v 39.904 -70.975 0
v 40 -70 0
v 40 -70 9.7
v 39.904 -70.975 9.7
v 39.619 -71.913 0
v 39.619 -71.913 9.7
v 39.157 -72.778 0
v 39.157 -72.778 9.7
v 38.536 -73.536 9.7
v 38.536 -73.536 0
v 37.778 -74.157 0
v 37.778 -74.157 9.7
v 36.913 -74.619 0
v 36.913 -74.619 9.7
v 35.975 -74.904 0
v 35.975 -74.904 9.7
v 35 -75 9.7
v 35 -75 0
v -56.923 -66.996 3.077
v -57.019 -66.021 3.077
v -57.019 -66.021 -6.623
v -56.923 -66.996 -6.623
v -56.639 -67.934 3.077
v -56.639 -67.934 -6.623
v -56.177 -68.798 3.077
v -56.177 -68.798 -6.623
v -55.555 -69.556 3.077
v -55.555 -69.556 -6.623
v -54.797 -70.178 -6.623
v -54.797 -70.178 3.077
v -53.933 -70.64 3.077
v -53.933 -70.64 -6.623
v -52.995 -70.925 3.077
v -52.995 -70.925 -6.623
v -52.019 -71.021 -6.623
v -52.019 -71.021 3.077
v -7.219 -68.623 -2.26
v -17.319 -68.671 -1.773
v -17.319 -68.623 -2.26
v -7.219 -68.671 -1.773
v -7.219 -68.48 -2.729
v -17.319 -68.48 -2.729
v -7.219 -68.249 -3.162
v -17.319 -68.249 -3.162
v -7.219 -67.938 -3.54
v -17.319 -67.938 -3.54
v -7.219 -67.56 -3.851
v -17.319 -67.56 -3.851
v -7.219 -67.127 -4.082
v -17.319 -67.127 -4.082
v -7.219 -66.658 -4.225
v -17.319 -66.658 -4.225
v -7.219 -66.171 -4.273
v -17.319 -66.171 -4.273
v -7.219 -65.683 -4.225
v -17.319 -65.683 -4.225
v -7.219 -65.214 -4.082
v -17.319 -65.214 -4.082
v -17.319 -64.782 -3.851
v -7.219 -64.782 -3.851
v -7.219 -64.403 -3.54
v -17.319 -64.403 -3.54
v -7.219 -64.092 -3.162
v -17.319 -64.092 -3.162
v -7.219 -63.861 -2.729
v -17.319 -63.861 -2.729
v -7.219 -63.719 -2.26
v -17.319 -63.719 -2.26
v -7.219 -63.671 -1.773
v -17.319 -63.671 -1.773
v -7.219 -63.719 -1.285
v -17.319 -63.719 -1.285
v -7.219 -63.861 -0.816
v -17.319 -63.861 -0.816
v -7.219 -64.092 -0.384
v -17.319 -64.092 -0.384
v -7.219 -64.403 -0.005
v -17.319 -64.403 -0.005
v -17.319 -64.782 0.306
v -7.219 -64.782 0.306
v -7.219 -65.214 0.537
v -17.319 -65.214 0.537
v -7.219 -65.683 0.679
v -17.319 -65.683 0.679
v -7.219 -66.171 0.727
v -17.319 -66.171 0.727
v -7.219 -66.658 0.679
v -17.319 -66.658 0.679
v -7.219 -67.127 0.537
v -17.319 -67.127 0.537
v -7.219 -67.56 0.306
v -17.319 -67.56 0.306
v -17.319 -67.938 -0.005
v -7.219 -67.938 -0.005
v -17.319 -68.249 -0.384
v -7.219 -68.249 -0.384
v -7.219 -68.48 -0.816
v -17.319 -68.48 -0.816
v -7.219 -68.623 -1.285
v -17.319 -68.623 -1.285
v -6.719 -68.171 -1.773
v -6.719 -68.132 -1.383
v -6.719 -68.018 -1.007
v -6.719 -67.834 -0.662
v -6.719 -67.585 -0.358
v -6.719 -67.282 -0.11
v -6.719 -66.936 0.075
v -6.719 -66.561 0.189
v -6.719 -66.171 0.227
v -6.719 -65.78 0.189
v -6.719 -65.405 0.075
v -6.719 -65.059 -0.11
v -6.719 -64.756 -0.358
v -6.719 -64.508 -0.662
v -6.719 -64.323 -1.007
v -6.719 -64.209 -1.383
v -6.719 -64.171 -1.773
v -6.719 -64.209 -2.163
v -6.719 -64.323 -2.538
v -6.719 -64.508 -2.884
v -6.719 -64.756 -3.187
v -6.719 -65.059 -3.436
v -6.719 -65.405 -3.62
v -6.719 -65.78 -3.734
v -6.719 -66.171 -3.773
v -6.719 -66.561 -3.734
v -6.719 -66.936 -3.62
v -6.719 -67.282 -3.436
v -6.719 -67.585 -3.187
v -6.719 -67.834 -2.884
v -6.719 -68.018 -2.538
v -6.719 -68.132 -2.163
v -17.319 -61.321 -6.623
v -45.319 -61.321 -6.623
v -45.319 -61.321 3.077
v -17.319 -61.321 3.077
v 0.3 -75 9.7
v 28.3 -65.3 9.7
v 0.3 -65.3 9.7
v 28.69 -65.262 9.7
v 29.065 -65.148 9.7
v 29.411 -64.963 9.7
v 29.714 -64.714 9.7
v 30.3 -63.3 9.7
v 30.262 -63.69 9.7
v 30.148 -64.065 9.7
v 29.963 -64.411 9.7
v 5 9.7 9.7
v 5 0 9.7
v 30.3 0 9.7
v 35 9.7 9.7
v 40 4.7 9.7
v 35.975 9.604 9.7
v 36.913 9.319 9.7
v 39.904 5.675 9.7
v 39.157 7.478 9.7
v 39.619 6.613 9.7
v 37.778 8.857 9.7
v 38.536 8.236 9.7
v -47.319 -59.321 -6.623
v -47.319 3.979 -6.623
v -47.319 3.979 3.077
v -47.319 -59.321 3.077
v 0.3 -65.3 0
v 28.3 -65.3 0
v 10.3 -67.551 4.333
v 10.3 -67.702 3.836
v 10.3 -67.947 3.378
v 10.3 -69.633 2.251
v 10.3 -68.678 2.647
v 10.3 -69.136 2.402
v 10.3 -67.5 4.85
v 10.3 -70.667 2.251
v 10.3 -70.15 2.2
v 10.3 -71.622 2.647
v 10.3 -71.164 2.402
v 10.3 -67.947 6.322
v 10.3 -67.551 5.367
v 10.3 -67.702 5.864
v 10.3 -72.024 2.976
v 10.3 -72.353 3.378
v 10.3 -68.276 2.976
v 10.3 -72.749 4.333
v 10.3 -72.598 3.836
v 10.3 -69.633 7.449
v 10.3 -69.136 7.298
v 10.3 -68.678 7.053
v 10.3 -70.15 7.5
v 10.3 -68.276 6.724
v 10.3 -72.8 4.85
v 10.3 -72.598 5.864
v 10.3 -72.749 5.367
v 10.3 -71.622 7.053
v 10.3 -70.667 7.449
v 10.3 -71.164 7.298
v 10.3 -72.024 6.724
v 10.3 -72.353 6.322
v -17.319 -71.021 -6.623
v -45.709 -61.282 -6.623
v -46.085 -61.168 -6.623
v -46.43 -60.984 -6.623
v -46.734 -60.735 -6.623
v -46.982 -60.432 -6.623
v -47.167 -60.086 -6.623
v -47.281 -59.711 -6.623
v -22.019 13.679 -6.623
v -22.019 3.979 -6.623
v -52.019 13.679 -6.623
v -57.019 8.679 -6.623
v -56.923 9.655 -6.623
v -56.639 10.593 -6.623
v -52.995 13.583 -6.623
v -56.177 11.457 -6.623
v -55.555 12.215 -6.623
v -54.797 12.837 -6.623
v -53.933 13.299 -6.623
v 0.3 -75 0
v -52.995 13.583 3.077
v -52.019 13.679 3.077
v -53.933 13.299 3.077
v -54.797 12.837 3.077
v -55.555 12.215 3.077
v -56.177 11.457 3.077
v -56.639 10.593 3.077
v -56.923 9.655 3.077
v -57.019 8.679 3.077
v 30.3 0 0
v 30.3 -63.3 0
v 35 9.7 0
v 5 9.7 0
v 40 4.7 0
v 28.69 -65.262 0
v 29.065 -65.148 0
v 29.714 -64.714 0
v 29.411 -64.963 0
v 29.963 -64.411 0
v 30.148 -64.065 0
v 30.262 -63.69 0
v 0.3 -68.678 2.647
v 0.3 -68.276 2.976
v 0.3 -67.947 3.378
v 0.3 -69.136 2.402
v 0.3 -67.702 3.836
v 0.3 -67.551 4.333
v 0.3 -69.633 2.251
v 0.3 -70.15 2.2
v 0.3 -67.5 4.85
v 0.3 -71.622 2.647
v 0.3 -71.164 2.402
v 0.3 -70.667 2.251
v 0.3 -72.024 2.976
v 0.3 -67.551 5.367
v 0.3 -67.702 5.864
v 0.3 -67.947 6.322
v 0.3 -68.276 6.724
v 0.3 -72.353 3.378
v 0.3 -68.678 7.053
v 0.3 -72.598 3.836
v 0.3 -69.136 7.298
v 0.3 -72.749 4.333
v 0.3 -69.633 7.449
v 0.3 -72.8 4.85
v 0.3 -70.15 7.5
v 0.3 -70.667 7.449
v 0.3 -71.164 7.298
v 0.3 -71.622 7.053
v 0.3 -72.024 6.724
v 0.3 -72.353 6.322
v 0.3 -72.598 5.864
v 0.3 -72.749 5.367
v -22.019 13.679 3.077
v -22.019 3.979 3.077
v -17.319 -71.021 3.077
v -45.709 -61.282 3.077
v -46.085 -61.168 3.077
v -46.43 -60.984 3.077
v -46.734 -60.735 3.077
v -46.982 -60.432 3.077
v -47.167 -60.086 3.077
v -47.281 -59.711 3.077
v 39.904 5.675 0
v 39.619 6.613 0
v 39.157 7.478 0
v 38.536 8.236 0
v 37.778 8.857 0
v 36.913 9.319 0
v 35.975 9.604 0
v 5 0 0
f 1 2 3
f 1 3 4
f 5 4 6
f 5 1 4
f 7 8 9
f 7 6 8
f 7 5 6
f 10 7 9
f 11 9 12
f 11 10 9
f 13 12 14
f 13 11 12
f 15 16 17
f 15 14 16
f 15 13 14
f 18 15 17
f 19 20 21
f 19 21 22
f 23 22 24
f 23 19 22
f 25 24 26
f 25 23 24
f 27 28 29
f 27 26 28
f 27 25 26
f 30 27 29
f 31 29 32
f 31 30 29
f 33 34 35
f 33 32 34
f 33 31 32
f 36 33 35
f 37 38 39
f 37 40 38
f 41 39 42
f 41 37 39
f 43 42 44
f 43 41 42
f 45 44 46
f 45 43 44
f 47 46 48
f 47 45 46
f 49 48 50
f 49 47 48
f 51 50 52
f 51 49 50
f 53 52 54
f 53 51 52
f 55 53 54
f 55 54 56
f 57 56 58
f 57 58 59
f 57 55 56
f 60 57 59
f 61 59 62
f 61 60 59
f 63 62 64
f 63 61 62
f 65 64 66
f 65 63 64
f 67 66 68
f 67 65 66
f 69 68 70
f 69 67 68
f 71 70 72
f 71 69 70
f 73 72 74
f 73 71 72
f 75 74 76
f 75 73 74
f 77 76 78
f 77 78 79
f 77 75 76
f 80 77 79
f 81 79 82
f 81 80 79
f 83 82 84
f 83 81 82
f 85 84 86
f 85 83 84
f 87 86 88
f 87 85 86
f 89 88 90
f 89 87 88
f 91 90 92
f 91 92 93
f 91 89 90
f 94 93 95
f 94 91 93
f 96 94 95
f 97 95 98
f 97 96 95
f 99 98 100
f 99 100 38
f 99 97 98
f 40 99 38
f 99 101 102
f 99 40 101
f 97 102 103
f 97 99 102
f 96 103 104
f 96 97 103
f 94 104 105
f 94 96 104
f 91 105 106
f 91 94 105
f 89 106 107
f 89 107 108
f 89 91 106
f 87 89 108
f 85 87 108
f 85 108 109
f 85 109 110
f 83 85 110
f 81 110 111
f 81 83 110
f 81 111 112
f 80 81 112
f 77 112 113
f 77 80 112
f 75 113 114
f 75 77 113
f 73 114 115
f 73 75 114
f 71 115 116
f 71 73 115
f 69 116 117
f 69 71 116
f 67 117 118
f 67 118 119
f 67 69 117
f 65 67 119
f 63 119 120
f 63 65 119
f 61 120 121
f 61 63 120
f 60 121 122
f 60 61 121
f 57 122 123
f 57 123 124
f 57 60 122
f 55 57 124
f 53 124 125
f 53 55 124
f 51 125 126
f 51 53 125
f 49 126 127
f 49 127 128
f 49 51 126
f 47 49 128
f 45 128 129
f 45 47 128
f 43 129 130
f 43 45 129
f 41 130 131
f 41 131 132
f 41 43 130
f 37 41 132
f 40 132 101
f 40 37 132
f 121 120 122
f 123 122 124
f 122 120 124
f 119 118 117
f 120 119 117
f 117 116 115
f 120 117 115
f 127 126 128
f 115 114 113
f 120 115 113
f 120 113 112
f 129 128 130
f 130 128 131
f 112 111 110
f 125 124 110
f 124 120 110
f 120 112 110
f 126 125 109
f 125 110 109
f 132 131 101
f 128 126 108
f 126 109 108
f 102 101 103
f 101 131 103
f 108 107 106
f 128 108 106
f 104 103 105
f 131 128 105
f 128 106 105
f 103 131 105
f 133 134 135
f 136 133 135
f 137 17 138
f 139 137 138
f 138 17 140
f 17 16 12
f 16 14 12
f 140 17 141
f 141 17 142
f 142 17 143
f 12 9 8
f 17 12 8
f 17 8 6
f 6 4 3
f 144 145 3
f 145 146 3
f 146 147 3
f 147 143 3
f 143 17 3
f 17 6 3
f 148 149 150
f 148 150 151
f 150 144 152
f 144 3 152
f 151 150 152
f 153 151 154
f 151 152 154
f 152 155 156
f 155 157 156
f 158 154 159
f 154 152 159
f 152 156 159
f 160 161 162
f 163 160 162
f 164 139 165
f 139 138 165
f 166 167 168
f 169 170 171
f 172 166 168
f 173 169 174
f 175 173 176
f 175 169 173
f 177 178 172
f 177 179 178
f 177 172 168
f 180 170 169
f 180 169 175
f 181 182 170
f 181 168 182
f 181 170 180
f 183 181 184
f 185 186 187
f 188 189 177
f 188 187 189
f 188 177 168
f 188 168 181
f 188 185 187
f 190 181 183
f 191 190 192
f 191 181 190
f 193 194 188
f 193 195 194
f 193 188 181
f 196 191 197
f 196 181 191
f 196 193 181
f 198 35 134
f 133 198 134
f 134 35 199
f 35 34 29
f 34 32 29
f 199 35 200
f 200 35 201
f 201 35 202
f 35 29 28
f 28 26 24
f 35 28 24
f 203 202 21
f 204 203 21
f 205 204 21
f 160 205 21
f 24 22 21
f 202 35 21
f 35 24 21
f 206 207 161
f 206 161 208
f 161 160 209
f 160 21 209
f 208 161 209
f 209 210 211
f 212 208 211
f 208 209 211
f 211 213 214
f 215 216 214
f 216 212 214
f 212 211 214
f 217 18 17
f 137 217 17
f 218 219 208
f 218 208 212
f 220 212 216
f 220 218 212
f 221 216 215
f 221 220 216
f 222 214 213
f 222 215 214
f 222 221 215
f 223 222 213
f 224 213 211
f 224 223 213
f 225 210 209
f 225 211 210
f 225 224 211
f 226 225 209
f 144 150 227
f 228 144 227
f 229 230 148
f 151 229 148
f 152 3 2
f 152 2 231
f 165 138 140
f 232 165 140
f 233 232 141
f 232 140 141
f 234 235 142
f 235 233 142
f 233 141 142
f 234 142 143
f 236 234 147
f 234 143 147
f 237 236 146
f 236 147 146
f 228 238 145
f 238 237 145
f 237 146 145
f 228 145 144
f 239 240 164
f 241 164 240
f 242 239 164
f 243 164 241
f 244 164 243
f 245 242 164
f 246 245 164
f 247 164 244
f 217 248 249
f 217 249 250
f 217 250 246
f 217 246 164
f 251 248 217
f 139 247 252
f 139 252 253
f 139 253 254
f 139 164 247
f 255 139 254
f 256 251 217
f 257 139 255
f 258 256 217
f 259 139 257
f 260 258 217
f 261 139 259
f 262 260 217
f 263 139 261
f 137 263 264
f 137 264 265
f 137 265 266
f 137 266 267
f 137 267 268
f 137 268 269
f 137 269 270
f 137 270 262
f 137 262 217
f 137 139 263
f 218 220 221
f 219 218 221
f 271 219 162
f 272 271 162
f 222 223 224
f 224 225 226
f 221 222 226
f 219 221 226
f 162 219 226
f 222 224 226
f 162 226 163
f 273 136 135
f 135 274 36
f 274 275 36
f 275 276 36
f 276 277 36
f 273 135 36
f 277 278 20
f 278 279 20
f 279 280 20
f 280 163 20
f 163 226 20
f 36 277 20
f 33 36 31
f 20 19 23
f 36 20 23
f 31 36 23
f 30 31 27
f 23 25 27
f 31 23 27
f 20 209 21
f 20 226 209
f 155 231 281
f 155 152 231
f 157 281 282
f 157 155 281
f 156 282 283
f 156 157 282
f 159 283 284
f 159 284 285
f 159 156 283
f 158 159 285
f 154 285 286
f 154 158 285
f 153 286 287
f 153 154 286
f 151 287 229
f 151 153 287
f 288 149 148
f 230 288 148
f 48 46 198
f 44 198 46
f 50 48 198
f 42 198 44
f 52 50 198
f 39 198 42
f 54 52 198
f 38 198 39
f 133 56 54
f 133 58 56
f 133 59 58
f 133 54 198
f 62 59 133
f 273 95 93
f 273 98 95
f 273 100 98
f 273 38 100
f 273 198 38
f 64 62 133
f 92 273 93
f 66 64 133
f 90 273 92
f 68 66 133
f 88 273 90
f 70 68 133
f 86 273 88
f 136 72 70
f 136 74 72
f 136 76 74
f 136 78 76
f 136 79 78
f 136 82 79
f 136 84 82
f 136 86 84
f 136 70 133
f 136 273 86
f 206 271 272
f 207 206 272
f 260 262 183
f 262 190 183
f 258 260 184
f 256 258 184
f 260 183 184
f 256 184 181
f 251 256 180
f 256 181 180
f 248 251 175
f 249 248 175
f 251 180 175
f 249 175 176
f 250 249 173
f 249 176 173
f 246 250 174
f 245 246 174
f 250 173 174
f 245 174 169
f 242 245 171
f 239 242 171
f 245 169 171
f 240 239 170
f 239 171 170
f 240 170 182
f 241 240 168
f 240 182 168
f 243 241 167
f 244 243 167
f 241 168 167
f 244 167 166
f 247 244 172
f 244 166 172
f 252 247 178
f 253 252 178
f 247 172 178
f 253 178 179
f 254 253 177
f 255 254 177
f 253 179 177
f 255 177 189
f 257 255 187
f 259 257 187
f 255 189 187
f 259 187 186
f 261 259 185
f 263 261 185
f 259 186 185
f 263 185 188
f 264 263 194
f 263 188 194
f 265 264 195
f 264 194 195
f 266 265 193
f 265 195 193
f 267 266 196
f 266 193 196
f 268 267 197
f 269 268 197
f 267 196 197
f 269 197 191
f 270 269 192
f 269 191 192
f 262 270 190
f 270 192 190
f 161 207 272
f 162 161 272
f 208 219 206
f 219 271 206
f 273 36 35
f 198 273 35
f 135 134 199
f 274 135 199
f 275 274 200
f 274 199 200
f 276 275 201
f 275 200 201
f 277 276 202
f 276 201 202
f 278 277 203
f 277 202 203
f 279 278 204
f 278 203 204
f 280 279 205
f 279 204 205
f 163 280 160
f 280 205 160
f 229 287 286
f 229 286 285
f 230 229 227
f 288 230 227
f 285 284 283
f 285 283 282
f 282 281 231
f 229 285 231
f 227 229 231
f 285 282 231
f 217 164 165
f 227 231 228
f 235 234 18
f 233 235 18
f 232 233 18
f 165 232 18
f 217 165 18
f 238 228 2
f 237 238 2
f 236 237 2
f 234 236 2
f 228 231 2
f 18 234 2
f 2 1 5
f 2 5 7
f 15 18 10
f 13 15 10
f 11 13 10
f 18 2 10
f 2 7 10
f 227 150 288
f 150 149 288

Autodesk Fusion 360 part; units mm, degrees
sketch "Sketch1" plane through (0, 0, 0) normal (1, 0, 0) x (0, 1, 0)
  line L0 (0, 0) -> (9.7, 0)
  line L1 (9.7, 0) -> (9.7, 9.7)
  line L2 (9.7, 9.7) -> (0, 9.7)
  line L3 (0, 9.7) -> (0, 0)
  dimension "d1" = 9.7
  dimension "d2" = 9.7
extrude "Extrude1" add sketch "Sketch1" along normal blind 40 makes body 1
sketch "Sketch2" plane through (0, 0, 0) normal (0, -1, 0) x (1, 0, 0)
  line L0 (0, 9.7) -> (0, 0)
  line L1 (0, 0) -> (40, 0)
  line L2 (40, 0) -> (40, 9.7)
  line L3 (40, 9.7) -> (0, 9.7)
  line L4 (40, 9.7) -> (30.3, 9.7)
  line L5 (30.3, 9.7) -> (30.3, 0)
  line L6 (30.3, 0) -> (40, 0)
  line L7 (40, 0) -> (40, 9.7)
  dimension "d5" = 9.7
extrude "Extrude2" add sketch "Sketch2" along normal blind 75 contours L1 L2 L3 L4 L5 L6 L7 bodies 1
sketch "Sketch3" plane through (30.3, 0, 0) normal (-1, 0, 0) x (0, -1, 0)
  line L0 (0, 9.7) -> (0, 0)
  line L1 (0, 0) -> (75, 0)
  line L2 (75, 0) -> (75, 9.7)
  line L3 (75, 9.7) -> (0, 9.7)
  line L4 (75, 9.7) -> (65.3, 9.7)
  line L5 (65.3, 9.7) -> (65.3, -2.721)
  line L6 (65.3, -2.721) -> (75, -2.721)
  line L7 (75, -2.721) -> (75, 9.7)
  dimension "d8" = 9.7
extrude "Extrude3" add sketch "Sketch3" along normal blind 30 contours L1 L2 L3 L4 L5 L7 bodies 1
sketch "Sketch4" plane through (0.3, 0, 0) normal (-1, 0, 0) x (0, -1, 0)
  line L0 (75, 0) -> (75, 9.7)
  line L1 (75, 9.7) -> (65.3, 9.7)
  line L2 (65.3, 9.7) -> (65.3, 0)
  line L3 (65.3, 0) -> (75, 0)
  circle A0 centre (70.15, 4.85) radius 2.5
  line L4 (70.15, 9.7) -> (70.15, 0)
  line L5 (65.3, 4.85) -> (75, 4.85)
  dimension "d11" = 5
extrude "Extrude5" cut sketch "Sketch4" along normal mid plane 20 contours A0 L4 L5 | A0 L4 L5 | A0 L4 L5 | A0 L4 L5 bodies 1
mirror "Mirror1" about plane through (0, 0, 0) normal (1, 0, 0) of bodies 1 makes body 2
extrude "Extrude6" add sketch "Sketch4" along normal up to surface (10.6 mm away) and the other way blind 10 contours A0 L4 L5 | A0 L4 L5 | A0 L4 L5 | A0 L4 L5 bodies 2
chamfer "Chamfer1" distance 0.5 angle 45 1 edges at (10.3, -67.8192, 5.754) on bodies 2
copy_body "Body->Comp1" bodies 1 removing the originals makes body 3 in component "Component"
copy_body "Body->Comp2" bodies 2 removing the originals makes body 4 in component "Component'"
move_face "OffsetFaces1" offset -0.15 1 faces at (3.6333, -72.6376, 5.0989) on bodies 3 in component "Component"
extrude "Extrude1'" cut 1 faces at (0, 3.2333, 6.4667) along direction (1, 0, 0) blind 5 on bodies 3 bodies 3 in component "Component"
extrude "Extrude1''" cut 1 faces at (0, 3.2333, 6.4667) along direction (-1, 0, 0) blind 5 on bodies 4 bodies 4 in component "Component'"
fillet "Fillet1" radius 2 1 edges at (30.3, -65.3, 4.85) on bodies 3 in component "Component"
fillet "Fillet1'" radius 2 1 edges at (-30.3, -65.3, 4.85) on bodies 4 in component "Component'"
fillet "Fillet2" radius 5 1 edges at (40, -75, 4.85) on bodies 3 in component "Component"
fillet "Fillet2'" radius 5 1 edges at (-40, -75, 4.85) on bodies 4 in component "Component'"
fillet "Fillet3" radius 5 1 edges at (40, 9.7, 4.85) on bodies 3 in component "Component"
fillet "Fillet3'" radius 5 1 edges at (-40, 9.7, 4.85) on bodies 4 in component "Component'"
component "Component" placed x (1, 0, 0) y (0, 1, 0) z (0, 0, 1) at (0, 0, 0)
component "Component'" placed x (1, 0, 0) y (0, 1, 0) z (0, 0, 1) at (-17.0193, 3.9794, -6.6227)
